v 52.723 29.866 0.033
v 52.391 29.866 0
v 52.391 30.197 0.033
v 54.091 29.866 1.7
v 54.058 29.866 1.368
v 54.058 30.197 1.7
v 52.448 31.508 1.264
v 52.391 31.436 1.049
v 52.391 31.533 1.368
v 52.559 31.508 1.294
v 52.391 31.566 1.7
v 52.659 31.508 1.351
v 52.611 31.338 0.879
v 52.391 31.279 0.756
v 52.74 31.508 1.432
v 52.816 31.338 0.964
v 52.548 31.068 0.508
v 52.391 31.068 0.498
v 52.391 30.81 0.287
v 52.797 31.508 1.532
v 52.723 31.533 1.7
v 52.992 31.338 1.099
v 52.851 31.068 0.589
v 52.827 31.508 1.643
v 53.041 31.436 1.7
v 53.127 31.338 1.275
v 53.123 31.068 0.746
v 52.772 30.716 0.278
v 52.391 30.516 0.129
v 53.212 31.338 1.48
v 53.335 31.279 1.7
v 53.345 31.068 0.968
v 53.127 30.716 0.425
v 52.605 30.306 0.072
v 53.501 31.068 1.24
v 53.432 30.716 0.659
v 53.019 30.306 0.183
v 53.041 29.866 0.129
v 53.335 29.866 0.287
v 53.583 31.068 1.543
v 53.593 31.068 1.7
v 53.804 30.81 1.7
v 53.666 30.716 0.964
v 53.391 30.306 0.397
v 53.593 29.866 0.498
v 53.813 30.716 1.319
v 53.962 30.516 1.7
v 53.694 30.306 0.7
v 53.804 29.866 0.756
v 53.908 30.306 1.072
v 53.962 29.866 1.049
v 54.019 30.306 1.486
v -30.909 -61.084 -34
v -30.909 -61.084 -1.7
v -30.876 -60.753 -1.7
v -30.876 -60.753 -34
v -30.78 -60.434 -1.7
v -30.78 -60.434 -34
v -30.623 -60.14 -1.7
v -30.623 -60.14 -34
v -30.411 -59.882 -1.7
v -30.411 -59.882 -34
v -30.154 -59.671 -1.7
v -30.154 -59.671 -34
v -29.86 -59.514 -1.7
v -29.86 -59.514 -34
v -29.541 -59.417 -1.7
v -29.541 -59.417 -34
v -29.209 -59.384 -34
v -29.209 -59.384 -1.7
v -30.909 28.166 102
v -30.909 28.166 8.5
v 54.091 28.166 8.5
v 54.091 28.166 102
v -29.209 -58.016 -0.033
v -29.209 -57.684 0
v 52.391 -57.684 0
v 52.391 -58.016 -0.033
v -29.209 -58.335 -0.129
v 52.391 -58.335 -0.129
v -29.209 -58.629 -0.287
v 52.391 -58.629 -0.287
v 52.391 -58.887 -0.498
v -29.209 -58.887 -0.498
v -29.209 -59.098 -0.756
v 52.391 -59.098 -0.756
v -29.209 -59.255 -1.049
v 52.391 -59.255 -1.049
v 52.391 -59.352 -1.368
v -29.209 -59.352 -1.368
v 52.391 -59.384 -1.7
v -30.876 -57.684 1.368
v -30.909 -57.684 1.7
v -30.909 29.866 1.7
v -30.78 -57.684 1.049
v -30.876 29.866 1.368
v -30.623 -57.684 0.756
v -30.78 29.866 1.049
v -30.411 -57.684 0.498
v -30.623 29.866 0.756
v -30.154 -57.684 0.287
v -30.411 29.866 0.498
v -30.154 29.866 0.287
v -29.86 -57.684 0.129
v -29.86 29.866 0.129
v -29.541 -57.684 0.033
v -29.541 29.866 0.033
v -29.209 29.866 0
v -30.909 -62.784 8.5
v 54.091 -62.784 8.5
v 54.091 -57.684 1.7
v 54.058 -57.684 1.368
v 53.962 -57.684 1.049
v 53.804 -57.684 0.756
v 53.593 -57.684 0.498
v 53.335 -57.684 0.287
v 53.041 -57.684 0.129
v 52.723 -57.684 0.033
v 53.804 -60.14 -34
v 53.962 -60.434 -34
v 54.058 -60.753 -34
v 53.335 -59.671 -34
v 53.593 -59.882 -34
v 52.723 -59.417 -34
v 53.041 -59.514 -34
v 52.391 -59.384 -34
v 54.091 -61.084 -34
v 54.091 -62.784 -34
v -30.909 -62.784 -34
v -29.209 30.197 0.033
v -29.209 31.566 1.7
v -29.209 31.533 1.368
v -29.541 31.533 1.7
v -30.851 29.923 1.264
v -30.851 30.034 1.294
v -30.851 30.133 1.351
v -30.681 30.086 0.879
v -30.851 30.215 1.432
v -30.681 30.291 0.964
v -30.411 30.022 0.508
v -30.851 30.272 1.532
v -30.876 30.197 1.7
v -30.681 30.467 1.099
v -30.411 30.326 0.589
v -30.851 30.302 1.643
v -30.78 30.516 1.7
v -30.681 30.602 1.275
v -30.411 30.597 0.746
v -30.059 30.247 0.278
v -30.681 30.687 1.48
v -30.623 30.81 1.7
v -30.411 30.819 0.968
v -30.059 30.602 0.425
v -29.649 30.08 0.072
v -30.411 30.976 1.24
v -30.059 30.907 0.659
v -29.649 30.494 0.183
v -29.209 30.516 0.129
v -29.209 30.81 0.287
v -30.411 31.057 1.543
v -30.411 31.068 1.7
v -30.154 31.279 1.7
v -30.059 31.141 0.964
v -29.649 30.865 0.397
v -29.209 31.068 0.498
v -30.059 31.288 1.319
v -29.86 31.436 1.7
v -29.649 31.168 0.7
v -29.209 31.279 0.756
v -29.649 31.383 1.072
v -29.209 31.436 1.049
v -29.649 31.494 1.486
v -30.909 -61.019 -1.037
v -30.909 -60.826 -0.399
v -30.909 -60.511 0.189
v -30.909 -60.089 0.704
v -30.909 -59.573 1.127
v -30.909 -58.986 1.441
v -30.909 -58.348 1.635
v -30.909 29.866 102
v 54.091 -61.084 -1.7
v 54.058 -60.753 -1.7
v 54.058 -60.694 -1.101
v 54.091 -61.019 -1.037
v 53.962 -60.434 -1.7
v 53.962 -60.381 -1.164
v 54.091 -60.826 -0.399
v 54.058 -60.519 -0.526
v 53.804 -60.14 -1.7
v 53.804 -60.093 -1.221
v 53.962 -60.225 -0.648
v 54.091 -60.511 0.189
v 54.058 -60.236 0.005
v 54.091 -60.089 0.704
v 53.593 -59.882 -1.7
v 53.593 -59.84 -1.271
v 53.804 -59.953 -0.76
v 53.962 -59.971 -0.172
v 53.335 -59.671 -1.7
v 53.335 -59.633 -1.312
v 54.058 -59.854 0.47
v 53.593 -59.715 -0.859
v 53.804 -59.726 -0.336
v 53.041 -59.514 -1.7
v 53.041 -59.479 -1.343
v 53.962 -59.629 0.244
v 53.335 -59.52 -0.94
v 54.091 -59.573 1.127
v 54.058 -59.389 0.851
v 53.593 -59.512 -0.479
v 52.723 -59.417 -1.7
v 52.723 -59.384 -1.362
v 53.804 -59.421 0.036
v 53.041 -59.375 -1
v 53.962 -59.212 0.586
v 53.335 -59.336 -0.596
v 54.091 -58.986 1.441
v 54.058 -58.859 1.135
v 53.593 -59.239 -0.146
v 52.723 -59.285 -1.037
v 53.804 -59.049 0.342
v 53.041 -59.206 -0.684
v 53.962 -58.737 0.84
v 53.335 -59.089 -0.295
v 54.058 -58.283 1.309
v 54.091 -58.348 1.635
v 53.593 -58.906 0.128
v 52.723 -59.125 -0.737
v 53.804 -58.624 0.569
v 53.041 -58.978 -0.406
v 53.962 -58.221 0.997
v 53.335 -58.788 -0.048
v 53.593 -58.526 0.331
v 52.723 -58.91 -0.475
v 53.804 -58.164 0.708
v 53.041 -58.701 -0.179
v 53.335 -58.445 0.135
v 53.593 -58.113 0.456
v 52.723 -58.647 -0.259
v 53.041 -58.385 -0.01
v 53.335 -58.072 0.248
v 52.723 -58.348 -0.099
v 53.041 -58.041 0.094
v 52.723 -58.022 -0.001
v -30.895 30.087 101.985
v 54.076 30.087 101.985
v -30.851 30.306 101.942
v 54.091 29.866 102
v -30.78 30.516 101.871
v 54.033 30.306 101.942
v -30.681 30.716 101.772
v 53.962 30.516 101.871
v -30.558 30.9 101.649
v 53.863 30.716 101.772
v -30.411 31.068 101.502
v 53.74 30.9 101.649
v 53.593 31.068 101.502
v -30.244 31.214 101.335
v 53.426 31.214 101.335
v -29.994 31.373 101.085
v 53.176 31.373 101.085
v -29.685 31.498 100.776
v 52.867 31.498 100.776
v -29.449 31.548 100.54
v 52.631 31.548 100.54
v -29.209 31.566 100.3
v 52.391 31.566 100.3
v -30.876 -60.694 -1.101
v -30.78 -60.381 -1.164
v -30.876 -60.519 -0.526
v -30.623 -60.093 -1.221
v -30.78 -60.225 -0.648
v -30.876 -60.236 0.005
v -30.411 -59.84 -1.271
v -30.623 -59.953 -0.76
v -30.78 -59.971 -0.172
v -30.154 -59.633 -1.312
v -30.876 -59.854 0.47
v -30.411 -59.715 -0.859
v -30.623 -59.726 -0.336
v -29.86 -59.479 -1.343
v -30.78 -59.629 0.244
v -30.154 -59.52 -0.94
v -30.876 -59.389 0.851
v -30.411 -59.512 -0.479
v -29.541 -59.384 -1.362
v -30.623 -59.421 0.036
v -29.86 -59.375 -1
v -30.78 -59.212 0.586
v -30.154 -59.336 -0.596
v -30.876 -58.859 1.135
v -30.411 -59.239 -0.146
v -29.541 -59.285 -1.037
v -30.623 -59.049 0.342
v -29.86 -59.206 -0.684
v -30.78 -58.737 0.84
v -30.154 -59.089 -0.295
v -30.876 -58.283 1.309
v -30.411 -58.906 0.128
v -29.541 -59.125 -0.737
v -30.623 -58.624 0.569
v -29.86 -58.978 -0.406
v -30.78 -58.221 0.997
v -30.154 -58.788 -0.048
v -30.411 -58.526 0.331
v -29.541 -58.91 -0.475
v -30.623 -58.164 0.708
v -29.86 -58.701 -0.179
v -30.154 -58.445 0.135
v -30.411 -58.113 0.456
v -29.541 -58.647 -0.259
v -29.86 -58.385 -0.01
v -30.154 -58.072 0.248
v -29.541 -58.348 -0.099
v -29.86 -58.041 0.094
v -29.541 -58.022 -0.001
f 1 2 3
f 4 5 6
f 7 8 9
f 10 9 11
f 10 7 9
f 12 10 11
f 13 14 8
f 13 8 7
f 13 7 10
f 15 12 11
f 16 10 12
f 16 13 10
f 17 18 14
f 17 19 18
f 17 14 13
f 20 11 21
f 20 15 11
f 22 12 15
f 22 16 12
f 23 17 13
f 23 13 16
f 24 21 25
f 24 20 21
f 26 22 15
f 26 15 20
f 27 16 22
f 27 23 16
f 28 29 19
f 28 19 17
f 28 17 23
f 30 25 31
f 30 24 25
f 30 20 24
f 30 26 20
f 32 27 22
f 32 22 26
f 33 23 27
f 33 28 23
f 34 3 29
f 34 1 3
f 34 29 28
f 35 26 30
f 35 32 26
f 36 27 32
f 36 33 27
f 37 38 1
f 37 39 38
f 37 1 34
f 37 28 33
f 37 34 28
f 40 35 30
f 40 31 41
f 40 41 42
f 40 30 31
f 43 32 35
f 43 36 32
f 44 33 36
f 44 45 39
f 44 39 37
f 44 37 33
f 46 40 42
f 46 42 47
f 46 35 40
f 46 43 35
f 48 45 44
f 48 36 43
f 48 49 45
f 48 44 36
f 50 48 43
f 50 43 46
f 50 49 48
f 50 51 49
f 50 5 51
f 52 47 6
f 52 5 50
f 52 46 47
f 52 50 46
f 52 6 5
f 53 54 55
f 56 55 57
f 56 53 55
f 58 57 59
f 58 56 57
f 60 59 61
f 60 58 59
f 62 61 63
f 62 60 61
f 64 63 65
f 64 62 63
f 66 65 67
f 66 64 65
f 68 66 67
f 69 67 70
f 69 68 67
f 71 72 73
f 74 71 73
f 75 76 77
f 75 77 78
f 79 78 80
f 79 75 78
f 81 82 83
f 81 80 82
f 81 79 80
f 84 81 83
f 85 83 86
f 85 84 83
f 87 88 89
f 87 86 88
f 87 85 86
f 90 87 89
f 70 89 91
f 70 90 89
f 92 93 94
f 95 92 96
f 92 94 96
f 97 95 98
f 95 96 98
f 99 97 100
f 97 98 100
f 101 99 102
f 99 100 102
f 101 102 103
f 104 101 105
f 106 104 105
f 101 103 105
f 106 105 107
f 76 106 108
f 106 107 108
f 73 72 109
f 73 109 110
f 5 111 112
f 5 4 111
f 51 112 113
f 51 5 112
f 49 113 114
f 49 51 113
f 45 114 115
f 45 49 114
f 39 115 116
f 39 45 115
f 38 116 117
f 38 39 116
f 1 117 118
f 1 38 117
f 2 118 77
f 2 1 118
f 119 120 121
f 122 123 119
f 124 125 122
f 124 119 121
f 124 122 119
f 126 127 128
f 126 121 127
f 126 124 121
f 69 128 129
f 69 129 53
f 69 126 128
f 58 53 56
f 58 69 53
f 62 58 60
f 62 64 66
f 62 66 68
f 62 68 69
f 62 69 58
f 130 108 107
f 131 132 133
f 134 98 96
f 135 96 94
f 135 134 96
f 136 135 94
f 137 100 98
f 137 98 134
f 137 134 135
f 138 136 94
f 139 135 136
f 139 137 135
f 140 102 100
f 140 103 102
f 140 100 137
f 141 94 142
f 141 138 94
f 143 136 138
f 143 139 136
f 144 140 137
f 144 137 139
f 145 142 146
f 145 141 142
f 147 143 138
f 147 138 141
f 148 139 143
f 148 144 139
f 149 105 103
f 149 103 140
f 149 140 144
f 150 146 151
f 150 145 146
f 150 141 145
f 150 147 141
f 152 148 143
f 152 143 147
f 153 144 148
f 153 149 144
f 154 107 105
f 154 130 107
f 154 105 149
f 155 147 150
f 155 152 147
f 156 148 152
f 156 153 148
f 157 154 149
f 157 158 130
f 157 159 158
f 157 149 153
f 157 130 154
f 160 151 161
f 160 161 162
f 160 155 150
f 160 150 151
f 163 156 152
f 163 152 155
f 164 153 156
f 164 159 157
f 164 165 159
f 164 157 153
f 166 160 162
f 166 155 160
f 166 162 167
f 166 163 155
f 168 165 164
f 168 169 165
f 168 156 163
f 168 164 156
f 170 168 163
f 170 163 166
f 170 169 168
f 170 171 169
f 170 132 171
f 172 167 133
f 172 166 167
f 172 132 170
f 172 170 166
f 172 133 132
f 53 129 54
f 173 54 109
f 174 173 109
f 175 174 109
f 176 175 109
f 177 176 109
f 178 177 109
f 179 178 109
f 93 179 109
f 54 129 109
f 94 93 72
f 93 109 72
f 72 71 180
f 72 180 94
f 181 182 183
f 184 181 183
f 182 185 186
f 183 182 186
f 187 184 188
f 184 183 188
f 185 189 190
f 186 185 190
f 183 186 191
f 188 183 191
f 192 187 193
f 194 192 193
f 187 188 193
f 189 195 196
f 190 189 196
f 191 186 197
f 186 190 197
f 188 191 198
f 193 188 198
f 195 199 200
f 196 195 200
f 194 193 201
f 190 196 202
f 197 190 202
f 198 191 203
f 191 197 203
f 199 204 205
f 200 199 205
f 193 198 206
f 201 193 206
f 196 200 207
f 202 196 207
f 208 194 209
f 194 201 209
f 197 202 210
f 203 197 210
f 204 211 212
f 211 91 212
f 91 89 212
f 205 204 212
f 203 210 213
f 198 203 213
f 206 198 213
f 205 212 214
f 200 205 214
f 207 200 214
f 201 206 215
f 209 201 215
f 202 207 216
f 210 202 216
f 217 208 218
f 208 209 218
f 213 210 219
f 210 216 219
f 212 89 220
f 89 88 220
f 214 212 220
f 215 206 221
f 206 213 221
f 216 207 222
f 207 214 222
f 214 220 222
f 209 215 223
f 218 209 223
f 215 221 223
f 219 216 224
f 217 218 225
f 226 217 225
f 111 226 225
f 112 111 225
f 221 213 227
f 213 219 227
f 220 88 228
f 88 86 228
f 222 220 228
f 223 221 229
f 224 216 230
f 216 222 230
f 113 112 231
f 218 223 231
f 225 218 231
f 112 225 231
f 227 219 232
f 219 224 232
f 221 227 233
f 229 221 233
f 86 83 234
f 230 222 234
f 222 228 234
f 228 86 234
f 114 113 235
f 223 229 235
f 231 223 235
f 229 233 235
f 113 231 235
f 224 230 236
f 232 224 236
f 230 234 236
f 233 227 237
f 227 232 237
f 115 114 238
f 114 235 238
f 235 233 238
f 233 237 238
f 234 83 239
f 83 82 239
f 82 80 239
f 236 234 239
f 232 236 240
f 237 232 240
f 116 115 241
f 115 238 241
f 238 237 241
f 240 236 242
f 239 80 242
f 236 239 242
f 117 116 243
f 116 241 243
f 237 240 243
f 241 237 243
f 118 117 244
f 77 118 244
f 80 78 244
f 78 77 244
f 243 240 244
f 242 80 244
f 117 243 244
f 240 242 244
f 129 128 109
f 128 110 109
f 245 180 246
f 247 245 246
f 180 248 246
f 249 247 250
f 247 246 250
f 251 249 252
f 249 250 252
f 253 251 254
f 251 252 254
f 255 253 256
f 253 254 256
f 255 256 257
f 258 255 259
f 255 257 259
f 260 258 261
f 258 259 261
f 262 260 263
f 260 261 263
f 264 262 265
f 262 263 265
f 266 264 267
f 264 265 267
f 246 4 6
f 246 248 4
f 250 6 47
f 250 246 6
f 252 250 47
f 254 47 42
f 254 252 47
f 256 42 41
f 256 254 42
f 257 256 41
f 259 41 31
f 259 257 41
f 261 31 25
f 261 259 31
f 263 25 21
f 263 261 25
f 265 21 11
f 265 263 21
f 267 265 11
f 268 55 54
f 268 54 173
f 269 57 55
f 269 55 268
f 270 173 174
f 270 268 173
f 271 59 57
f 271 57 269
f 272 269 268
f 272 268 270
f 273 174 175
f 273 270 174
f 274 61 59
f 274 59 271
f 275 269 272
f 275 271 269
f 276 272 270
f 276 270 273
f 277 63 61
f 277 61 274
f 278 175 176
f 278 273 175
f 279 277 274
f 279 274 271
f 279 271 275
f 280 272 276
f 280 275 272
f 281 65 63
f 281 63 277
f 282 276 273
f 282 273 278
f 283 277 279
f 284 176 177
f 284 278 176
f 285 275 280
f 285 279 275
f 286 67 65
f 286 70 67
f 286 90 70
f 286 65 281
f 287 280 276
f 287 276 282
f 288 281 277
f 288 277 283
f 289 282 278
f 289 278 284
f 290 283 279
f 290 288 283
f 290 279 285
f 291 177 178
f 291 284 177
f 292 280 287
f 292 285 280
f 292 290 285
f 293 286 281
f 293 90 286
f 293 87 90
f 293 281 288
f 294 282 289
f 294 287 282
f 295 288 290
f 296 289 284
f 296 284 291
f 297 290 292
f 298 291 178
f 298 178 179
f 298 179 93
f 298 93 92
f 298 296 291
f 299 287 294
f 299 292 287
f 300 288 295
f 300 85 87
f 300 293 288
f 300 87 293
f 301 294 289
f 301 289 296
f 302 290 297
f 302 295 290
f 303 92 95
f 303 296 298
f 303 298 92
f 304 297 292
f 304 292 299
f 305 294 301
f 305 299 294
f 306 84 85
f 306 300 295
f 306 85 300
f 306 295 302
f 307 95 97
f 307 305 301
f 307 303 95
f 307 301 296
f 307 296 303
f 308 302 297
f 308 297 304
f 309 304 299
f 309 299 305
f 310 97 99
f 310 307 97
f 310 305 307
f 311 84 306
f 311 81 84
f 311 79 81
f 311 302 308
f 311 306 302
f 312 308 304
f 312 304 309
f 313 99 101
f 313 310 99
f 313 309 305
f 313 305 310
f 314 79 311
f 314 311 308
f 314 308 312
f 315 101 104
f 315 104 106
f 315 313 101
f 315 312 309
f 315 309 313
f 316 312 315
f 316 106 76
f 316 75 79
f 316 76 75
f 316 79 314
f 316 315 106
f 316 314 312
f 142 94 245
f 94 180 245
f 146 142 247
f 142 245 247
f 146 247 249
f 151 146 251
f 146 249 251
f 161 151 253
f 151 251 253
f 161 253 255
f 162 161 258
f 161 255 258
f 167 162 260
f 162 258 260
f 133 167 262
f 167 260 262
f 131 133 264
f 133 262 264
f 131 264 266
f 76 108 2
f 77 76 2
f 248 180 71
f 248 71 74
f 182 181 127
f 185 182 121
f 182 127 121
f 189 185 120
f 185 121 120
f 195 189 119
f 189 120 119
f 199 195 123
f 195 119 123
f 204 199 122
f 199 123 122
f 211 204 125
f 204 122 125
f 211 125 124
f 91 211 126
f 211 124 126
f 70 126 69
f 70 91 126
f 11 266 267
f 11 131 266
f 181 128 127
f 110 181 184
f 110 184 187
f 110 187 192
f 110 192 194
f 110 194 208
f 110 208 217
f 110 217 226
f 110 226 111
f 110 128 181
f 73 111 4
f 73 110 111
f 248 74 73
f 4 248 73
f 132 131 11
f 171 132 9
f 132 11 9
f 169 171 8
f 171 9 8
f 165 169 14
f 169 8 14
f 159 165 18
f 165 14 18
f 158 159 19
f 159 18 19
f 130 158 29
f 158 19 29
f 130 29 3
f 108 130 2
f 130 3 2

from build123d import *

# Parameters (mm, degrees)
SKETCH_1_W          = 50
SKETCH_1_H          = 55.5
EXTRUDE_1_DEPTH     = 60
SKETCH_3_W          = 50
SKETCH_3_H          = 53.5
CUT_EXTRUDE_1_DEPTH = 55
SKETCH_4_W          = 50
SKETCH_4_H          = 2
EXTRUDE_2_DEPTH     = 20
FILLET_5_R          = 1
SCALE_1_SCALE       = 1.7


with BuildPart() as part:
    # 草图1 → 凸台-拉伸1 (new body)
    with BuildSketch(Plane.XY):
        with Locations((6.818181818, -9.182037969)):
            Rectangle(SKETCH_1_W, SKETCH_1_H)
    extrude(amount=EXTRUDE_1_DEPTH)

    # 草图3 → 切除-拉伸1 (cut)
    with BuildSketch(Plane.XY.offset(60)):
        with Locations((6.818181818, -10.182037969)):
            Rectangle(SKETCH_3_W, SKETCH_3_H)
    extrude(amount=-CUT_EXTRUDE_1_DEPTH, mode=Mode.SUBTRACT)

    # 草图4 → 凸台-拉伸2 (add)
    with BuildSketch(Plane(origin=(0, 0, 0), x_dir=(-1, 0, 0), z_dir=(0, 0, -1))):
        with Locations((-6.818181818, -35.932037969)):
            Rectangle(SKETCH_4_W, SKETCH_4_H)
    extrude(amount=EXTRUDE_2_DEPTH)

    # 圆角5
    fillet_5_edges = [part.edges().sort_by_distance(p)[0] for p in [
        (6.818181818, 18.567962031, 60),
        (31.818181818, -8.182037969, 0),
        (6.818181818, -34.932037969, 0),
        (-18.181818182, -34.932037969, -10),
        (31.818181818, -34.932037969, -10),
        (6.818181818, 18.567962031, 0),
        (-18.181818182, -8.182037969, 0),
        (-18.181818182, 18.567962031, 30),
        (31.818181818, 18.567962031, 30),
    ]]
    fillet(fillet_5_edges, radius=FILLET_5_R)


with BuildPart() as part_1:
    # 缩放比例1: scaled about (0, 0, 0)
    add(part.part.scale(SCALE_1_SCALE))


solid = part_1.part
